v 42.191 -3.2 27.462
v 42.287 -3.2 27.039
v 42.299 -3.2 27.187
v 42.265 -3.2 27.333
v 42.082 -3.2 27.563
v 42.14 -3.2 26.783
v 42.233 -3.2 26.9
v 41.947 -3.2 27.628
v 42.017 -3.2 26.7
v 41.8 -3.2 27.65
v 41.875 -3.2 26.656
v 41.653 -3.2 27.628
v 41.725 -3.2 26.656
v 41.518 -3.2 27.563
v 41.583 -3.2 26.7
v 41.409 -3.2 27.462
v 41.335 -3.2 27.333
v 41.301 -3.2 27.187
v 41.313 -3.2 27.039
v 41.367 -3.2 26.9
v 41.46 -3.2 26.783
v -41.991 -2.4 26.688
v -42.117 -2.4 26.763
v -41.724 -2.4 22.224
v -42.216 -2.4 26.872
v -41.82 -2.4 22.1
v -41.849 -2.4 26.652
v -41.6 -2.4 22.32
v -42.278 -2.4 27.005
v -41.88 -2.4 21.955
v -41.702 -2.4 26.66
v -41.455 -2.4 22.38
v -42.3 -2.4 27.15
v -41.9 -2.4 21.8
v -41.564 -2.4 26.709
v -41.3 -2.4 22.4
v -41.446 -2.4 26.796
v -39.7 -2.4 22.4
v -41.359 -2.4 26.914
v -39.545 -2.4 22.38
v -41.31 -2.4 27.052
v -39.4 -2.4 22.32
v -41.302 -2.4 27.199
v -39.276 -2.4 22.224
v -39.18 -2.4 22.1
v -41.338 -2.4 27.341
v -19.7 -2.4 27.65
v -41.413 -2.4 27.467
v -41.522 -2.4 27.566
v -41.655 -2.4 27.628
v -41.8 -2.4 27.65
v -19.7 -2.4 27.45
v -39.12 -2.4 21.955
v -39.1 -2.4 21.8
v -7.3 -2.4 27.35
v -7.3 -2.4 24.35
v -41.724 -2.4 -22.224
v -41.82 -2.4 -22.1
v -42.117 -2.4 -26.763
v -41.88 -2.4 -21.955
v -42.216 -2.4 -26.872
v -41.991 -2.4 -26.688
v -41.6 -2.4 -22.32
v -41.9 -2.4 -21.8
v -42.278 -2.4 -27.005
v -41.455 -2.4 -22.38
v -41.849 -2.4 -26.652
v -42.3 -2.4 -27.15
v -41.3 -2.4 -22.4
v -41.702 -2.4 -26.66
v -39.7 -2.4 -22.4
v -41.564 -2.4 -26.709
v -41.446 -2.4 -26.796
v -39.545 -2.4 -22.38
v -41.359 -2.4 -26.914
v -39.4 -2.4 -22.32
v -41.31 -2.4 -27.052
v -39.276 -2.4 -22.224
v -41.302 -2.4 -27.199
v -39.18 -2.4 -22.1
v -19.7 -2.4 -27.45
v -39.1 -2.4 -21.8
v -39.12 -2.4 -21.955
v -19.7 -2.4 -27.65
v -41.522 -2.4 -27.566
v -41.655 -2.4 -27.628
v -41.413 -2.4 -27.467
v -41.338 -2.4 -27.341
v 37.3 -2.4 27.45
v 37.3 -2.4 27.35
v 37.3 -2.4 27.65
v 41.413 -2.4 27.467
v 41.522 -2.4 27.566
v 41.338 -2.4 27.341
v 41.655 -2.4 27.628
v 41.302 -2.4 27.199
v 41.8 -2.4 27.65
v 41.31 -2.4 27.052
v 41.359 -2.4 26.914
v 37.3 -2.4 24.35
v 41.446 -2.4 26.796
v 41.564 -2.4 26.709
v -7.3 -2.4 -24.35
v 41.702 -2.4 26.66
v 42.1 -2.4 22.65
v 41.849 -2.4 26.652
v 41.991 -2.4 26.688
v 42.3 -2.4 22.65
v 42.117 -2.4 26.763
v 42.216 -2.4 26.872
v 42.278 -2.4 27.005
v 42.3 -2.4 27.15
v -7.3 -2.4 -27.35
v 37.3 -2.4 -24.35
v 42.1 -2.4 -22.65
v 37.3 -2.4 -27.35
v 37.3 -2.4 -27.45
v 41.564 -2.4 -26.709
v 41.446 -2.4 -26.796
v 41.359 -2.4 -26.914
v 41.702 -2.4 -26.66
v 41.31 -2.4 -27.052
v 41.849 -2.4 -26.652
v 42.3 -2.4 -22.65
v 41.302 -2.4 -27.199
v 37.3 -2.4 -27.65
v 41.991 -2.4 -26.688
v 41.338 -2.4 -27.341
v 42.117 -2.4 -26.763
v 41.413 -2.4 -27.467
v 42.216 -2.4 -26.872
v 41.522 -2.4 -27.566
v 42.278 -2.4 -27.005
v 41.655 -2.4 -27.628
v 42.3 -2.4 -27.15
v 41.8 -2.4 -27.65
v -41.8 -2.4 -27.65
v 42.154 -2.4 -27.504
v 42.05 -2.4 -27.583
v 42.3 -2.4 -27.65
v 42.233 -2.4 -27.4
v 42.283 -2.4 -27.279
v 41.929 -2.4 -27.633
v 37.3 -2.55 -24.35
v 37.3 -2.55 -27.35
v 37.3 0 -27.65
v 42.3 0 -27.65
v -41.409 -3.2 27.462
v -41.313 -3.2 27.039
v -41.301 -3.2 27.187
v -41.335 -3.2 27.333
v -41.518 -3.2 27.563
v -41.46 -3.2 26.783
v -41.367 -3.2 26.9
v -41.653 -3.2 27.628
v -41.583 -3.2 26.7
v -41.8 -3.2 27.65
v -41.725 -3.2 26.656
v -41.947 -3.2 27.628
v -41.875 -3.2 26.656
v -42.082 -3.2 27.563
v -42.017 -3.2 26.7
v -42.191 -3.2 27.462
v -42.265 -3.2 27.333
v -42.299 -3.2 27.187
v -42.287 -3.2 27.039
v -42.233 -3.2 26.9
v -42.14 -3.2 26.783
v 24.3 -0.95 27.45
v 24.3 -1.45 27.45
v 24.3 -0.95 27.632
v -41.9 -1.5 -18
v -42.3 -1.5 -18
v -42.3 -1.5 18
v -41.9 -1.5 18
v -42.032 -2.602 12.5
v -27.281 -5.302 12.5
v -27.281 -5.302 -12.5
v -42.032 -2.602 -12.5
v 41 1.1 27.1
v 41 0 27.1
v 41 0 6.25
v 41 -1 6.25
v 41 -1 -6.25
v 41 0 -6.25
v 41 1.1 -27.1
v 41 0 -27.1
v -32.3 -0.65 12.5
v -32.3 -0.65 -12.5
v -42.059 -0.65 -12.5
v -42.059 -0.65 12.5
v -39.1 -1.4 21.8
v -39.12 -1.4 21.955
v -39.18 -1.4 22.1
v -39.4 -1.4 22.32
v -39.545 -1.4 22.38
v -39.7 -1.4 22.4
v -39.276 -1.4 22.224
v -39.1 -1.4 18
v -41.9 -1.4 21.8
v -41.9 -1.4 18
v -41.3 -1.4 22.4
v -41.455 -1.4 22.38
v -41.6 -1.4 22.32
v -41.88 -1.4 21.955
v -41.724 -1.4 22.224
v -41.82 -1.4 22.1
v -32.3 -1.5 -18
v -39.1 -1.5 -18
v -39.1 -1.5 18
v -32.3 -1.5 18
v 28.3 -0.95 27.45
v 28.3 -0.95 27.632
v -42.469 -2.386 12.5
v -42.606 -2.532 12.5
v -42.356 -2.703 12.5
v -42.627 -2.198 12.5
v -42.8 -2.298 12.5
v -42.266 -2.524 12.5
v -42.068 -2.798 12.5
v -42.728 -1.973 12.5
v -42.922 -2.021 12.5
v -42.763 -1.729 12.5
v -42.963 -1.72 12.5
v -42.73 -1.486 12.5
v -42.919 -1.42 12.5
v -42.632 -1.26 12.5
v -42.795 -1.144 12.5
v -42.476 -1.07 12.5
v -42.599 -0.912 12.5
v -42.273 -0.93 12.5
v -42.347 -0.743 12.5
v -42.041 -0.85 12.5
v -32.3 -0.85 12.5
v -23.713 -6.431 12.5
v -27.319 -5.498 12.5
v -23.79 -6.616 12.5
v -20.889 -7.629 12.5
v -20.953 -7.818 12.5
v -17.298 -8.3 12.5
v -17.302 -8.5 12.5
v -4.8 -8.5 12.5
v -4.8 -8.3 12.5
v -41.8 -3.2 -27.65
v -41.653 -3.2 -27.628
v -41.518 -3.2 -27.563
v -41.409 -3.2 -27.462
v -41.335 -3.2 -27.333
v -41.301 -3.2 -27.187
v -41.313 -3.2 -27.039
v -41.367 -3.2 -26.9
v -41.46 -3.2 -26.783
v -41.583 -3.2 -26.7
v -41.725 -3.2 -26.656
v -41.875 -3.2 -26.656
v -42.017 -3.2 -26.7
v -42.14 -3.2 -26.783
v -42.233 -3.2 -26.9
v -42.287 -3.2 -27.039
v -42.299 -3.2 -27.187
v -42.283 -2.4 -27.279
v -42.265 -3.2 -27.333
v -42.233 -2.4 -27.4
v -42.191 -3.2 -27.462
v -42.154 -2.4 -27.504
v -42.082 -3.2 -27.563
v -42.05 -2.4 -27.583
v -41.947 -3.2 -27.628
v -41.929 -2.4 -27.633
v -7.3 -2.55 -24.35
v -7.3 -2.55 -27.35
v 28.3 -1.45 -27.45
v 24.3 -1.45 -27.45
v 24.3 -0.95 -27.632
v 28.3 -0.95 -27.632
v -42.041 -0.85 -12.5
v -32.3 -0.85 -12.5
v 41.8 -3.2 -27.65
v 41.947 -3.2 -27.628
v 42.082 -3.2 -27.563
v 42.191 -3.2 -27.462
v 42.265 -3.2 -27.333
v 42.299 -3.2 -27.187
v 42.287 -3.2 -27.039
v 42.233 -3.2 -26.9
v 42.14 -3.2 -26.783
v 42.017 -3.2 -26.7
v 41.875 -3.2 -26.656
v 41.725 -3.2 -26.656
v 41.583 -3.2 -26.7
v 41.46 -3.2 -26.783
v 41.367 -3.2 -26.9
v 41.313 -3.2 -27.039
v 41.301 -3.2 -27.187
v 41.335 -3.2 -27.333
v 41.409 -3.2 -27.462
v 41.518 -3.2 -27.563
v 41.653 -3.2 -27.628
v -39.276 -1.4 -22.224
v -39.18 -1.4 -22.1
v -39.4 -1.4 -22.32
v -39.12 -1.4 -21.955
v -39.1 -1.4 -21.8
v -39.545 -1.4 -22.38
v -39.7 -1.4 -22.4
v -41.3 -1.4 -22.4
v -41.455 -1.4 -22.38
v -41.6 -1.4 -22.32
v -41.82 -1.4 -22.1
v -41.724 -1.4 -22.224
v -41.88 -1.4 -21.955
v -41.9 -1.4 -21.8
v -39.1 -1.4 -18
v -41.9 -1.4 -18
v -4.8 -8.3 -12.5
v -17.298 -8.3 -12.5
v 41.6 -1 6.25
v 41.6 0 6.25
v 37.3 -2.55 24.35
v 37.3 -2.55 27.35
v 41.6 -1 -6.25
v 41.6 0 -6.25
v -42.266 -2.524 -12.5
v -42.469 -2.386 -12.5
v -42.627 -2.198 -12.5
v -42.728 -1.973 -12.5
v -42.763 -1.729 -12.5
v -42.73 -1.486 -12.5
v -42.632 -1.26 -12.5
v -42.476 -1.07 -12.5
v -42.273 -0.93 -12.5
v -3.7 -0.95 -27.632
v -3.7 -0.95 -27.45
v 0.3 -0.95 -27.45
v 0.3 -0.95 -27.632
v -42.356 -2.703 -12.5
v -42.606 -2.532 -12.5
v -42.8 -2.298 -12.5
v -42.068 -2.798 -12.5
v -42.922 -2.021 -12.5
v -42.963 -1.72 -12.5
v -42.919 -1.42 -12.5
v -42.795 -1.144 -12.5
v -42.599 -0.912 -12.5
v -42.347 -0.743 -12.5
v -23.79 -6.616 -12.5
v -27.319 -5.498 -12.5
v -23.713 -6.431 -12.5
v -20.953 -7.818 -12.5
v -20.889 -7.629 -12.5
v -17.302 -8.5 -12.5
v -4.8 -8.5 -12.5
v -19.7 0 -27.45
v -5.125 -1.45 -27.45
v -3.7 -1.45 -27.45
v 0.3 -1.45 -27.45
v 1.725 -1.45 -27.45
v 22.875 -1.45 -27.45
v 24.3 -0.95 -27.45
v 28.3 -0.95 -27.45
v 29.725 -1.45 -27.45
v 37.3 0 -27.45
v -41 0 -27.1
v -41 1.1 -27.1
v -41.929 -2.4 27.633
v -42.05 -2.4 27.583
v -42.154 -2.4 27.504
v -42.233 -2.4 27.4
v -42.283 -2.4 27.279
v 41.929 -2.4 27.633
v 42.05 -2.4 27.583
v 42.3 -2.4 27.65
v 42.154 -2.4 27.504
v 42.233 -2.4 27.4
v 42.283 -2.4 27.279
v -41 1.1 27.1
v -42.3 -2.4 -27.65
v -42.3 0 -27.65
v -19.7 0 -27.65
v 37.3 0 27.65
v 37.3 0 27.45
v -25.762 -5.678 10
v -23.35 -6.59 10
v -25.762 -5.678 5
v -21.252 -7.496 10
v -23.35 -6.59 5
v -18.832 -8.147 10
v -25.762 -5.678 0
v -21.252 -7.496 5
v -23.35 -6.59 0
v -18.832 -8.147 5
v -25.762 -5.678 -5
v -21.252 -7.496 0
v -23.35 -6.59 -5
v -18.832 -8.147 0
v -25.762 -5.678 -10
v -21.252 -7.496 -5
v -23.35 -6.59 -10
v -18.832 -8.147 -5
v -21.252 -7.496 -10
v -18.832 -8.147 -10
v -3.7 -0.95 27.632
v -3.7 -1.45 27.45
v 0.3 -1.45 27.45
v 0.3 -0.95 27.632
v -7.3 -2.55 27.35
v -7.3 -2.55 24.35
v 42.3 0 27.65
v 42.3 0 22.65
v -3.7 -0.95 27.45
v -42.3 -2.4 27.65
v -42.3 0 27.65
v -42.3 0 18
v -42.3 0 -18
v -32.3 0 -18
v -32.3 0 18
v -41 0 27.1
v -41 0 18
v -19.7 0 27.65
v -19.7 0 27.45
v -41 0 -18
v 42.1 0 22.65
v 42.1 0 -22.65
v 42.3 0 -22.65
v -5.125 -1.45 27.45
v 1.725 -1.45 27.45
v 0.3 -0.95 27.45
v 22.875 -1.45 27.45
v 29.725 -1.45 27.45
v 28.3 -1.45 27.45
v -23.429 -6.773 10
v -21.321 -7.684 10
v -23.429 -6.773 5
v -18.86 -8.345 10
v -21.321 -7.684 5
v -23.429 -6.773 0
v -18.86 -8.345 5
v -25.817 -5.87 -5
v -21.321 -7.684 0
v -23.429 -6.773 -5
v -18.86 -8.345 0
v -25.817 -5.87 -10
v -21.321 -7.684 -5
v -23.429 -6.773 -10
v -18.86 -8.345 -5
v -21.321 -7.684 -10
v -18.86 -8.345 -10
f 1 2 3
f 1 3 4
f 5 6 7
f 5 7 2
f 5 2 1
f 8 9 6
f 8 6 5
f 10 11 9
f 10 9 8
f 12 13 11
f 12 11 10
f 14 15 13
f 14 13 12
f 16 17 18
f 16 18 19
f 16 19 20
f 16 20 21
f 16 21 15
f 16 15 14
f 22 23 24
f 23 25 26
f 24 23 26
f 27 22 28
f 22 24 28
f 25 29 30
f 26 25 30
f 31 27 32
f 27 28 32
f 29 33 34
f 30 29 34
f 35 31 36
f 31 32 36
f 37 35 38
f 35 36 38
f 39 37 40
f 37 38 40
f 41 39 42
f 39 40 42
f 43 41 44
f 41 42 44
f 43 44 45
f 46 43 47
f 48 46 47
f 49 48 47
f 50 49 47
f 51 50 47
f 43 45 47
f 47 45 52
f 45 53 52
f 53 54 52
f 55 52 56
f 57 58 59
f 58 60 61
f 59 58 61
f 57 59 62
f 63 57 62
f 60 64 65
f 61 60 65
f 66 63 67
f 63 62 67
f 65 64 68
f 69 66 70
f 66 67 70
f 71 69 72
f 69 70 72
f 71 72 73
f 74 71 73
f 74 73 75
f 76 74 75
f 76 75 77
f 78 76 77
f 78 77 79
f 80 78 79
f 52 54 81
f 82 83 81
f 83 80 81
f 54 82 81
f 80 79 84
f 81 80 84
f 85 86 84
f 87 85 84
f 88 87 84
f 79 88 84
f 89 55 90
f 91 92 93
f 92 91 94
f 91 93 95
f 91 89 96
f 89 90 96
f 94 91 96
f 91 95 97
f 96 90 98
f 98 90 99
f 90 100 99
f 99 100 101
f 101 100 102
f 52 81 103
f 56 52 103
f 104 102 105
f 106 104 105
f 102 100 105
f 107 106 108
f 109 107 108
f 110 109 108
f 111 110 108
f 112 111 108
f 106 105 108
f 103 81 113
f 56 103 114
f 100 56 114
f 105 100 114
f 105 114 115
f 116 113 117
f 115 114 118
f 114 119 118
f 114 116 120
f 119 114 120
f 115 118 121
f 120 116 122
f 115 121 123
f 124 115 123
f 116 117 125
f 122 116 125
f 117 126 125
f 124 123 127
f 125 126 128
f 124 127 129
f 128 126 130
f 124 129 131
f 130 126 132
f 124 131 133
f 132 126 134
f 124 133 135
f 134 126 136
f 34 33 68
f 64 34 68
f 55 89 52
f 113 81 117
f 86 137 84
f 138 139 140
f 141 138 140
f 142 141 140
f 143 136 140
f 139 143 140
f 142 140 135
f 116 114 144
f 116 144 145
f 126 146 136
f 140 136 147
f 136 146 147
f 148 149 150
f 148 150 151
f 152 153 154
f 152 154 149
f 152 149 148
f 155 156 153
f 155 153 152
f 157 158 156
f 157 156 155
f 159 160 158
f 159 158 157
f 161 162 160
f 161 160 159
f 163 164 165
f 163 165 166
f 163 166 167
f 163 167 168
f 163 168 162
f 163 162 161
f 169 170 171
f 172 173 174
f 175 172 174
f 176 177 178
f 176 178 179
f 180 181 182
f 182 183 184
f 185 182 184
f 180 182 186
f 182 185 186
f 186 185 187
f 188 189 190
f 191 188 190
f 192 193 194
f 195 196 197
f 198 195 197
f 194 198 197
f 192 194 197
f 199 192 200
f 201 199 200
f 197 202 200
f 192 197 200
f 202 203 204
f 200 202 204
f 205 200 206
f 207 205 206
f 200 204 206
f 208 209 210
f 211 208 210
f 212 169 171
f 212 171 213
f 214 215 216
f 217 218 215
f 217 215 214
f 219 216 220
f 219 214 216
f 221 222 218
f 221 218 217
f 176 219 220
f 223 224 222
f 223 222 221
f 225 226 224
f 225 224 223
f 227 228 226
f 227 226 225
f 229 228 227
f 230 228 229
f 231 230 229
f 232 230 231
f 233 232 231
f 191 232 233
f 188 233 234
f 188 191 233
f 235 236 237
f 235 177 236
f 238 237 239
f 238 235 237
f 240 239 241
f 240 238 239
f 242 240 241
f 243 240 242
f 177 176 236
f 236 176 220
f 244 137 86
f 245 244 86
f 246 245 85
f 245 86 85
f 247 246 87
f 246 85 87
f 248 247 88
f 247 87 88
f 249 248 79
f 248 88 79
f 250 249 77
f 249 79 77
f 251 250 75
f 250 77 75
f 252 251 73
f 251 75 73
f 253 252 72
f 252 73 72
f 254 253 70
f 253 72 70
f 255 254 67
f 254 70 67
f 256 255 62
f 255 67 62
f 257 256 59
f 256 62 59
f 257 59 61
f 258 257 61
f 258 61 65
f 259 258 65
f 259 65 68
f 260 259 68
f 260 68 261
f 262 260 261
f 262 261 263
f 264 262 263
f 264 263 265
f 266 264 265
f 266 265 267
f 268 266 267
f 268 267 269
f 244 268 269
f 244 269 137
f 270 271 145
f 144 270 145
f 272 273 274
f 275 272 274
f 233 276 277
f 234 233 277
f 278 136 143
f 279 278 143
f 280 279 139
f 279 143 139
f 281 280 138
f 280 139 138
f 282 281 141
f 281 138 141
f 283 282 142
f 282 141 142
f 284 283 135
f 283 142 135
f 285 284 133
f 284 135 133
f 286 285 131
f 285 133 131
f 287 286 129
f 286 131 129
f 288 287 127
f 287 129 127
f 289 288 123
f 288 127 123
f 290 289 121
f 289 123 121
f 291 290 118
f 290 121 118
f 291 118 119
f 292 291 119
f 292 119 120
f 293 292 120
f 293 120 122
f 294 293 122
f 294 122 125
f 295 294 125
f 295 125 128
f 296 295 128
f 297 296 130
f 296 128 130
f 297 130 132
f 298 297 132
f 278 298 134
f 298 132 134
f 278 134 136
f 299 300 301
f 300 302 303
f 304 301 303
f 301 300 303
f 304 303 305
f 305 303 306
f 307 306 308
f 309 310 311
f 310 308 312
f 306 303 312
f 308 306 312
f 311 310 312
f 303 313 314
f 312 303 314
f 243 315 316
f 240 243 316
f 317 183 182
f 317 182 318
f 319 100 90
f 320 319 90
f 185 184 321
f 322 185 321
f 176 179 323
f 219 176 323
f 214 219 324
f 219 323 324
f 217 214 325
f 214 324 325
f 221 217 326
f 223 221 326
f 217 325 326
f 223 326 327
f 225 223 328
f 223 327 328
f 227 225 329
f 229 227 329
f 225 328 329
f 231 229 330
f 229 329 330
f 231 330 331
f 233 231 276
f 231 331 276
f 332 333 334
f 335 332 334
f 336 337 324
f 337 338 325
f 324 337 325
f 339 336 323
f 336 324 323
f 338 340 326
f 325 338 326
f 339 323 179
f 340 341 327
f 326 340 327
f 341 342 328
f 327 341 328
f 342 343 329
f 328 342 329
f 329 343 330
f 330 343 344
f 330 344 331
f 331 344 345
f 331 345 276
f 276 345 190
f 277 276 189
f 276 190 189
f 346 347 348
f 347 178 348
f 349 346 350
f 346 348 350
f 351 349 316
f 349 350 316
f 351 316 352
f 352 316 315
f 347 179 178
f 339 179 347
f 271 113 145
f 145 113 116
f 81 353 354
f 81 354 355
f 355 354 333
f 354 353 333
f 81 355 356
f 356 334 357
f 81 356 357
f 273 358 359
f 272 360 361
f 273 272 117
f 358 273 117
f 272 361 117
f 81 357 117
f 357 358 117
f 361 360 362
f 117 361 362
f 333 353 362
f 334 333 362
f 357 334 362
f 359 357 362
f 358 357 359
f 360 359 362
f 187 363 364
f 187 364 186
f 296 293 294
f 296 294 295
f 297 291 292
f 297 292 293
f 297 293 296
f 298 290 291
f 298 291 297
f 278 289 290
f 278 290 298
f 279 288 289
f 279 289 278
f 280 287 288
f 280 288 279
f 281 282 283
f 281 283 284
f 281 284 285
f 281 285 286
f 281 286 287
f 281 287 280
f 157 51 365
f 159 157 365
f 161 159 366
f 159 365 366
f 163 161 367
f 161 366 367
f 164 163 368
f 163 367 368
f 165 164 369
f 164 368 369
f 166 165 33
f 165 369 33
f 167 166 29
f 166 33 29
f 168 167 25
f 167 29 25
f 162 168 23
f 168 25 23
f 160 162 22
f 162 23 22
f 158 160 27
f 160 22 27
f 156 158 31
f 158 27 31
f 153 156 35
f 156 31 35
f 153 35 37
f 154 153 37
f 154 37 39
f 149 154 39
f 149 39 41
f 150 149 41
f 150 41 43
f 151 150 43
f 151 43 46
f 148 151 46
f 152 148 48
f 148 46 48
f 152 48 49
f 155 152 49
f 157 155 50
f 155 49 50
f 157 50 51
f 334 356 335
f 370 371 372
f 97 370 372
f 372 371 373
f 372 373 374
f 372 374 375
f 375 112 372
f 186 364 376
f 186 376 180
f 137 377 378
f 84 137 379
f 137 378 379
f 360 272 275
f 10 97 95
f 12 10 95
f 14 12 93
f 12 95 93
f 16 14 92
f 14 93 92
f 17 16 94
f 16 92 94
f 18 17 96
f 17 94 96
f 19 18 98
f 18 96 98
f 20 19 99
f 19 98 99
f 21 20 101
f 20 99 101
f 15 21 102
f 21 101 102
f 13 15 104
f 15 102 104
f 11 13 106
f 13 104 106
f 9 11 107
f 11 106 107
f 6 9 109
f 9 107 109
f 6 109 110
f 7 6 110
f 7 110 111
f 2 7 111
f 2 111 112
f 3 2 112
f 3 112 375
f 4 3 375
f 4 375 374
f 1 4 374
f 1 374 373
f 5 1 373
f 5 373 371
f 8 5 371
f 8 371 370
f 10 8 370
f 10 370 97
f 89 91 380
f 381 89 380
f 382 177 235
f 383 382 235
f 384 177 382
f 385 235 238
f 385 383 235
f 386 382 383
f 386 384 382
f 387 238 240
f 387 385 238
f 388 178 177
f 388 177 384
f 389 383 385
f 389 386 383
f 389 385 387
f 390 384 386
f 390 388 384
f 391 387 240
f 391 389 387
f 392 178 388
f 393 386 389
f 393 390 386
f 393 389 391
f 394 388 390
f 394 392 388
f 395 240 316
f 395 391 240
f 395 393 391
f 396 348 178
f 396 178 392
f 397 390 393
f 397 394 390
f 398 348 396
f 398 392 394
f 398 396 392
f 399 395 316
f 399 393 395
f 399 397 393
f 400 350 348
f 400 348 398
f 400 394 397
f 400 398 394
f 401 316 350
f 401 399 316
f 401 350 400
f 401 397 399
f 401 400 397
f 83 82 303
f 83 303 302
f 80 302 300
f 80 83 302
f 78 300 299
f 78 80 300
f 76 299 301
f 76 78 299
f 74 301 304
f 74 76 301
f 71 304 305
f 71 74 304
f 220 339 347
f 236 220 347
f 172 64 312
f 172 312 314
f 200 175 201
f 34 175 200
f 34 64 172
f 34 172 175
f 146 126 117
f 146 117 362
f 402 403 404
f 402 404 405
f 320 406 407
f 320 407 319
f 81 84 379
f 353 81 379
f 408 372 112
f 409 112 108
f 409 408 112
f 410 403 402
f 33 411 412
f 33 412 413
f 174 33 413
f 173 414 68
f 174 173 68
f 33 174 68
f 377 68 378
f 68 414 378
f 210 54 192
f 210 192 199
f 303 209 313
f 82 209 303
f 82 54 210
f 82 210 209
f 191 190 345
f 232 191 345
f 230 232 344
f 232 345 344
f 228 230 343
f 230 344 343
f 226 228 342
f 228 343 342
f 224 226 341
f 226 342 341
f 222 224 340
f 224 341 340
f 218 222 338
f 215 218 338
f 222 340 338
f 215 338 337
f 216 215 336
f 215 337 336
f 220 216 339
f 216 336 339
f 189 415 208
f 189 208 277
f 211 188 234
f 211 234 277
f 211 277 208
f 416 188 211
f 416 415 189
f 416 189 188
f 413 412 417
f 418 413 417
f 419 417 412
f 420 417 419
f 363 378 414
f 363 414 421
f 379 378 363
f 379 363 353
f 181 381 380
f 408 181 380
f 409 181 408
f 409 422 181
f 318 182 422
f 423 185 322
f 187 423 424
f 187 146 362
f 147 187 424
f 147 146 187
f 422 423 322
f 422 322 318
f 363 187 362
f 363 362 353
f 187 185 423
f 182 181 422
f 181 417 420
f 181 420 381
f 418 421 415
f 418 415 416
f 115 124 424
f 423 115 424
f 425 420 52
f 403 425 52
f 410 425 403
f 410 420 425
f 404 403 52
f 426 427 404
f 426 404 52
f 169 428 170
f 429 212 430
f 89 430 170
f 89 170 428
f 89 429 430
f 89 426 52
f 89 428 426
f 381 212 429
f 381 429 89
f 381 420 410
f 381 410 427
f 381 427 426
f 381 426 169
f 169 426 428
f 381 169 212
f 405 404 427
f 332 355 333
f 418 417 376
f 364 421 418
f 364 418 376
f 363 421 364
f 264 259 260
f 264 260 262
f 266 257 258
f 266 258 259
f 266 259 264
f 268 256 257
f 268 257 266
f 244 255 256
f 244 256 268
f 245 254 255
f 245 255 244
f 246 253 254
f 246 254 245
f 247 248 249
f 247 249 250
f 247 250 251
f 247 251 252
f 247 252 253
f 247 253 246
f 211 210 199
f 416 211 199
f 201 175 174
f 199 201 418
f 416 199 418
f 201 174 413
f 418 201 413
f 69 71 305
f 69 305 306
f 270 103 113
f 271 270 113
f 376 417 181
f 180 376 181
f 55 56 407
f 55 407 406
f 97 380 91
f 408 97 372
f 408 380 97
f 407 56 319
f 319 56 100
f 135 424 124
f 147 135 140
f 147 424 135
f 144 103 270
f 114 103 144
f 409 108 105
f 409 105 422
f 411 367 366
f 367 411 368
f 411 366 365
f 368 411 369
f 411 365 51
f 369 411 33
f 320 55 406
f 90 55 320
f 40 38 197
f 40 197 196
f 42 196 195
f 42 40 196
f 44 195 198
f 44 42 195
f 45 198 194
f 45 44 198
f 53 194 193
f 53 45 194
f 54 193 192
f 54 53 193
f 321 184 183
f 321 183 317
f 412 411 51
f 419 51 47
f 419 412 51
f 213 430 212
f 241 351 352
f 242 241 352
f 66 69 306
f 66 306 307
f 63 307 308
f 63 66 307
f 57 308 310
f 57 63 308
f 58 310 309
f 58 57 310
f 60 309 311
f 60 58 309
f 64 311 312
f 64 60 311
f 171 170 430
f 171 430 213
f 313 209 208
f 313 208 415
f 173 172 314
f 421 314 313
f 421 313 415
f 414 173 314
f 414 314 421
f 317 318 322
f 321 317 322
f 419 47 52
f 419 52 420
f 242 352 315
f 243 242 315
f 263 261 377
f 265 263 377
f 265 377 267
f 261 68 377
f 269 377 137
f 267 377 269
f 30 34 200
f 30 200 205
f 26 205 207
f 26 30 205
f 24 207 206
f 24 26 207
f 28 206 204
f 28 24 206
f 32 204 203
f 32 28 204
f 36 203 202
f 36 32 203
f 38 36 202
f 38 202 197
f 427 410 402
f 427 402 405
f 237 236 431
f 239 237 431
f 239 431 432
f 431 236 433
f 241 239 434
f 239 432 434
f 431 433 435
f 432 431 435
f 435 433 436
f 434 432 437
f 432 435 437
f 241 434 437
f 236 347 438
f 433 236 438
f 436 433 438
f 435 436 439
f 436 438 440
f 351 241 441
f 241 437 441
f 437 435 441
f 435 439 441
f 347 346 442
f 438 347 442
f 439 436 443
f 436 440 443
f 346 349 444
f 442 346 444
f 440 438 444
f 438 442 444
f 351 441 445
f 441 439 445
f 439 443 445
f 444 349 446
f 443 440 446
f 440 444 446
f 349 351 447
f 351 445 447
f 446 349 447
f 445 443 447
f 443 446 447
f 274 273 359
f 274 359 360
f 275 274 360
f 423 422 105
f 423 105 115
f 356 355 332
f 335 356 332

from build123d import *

# Parameters (mm, degrees)
SKETCH1_W                  = 84.6
SKETCH1_H                  = 55.3
BOSS_EXTRUDE1_DEPTH        = 2.4
SKETCH2_W                  = 82
SKETCH2_H                  = 54.2
BOSS_EXTRUDE2_DEPTH        = 1.1
SKETCH3_R                  = 0.5
BOSS_EXTRUDE3_DEPTH        = 0.8
CUT_EXTRUDE1_DEPTH         = 1
SKETCH5_W                  = 57
SKETCH5_H                  = 2.4
CUT_EXTRUDE2_DEPTH         = 0.2
SKETCH6_W                  = 45.3
SKETCH6_H                  = 2.4
CUT_EXTRUDE3_DEPTH         = 0.2
SKETCH7_W                  = 44.6
SKETCH7_H                  = 3
BOSS_EXTRUDE4_DEPTH        = 0.15
SKETCH8_W                  = 0.6
SKETCH8_H                  = 12.5
CUT_EXTRUDE4_DEPTH         = 1
SKETCH9_W                  = 4
SKETCH9_H                  = 0.5
BOSS_EXTRUDE5_DEPTH        = 0.2
CHAMFER1_SIZE              = 0.2
CHAMFER1_SIZE_2            = 0.549495484
CHAMFER1_OF_MIRROR4_SIZE   = 0.2
CHAMFER1_OF_MIRROR4_SIZE_2 = 0.549495484
SKETCH10_W                 = 36
SKETCH10_H                 = 1.5
CUT_EXTRUDE5_DEPTH         = 10
BOSS_EXTRUDE7_DEPTH        = 12.5
BOSS_EXTRUDE7_DEPTH_BACK   = 12.5


with BuildPart() as part:
    # Sketch1 → Boss-Extrude1 (new body)
    with BuildSketch(Plane(origin=(0, 0, 0), x_dir=(1, 0, 0), z_dir=(0, 1, 0))):
        Rectangle(SKETCH1_W, SKETCH1_H)
    extrude(amount=-BOSS_EXTRUDE1_DEPTH)

    # Sketch2 → Boss-Extrude2 (add)
    with BuildSketch(Plane(origin=(0, 0, 0), x_dir=(1, 0, 0), z_dir=(0, 1, 0))):
        Rectangle(SKETCH2_W, SKETCH2_H)
    extrude(amount=BOSS_EXTRUDE2_DEPTH)

    # Sketch3 → Boss-Extrude3 (add)
    with BuildSketch(Plane.XZ.offset(2.4)):
        with Locations(Location((-41.8, 27.15, 0), (0, 0, 90))):
            Circle(SKETCH3_R)
        with Locations(Location((41.8, 27.15, 0), (0, 0, 90))):
            Circle(SKETCH3_R)
        with Locations(Location((41.8, -27.15, 0), (0, 0, 270))):
            Circle(SKETCH3_R)
        with Locations(Location((-41.8, -27.15, 0), (0, 0, 270))):
            Circle(SKETCH3_R)
    extrude(amount=BOSS_EXTRUDE3_DEPTH)

    # Sketch4 → Cut-Extrude1 (cut)
    with BuildSketch(Plane.XZ.offset(2.4)):
        with BuildLine():
            Line((-39.7, -22.4), (-41.3, -22.4))
            ThreePointArc((-41.3, -22.4), (-41.724264069, -22.224264069), (-41.9, -21.8))
            Line((-41.9, -21.8), (-41.9, 21.8))
            ThreePointArc((-41.9, 21.8), (-41.724264069, 22.224264069), (-41.3, 22.4))
            Line((-41.3, 22.4), (-39.7, 22.4))
            ThreePointArc((-39.7, 22.4), (-39.275735931, 22.224264069), (-39.1, 21.8))
            Line((-39.1, 21.8), (-39.1, -21.8))
            ThreePointArc((-39.1, -21.8), (-39.275735931, -22.224264069), (-39.7, -22.4))
        make_face()
    extrude(amount=-CUT_EXTRUDE1_DEPTH, mode=Mode.SUBTRACT)

    # Sketch5 → Cut-Extrude2 (cut)
    with BuildSketch(Plane.XY.offset(27.65)):
        with Locations((8.8, -1.2)):
            Rectangle(SKETCH5_W, SKETCH5_H)
    cut_extrude2 = extrude(amount=-CUT_EXTRUDE2_DEPTH, mode=Mode.SUBTRACT)

    # Mirror1: Cut-Extrude2 across plane
    add(cut_extrude2.mirror(Plane.XY), mode=Mode.SUBTRACT)

    # Sketch6 → Cut-Extrude3 (cut)
    with BuildSketch(Plane(origin=(42.3, 0, 0), x_dir=(0, 0, -1), z_dir=(1, 0, 0))):
        with Locations((0, -1.2)):
            Rectangle(SKETCH6_W, SKETCH6_H)
    extrude(amount=-CUT_EXTRUDE3_DEPTH, mode=Mode.SUBTRACT)

    # Sketch7 → Boss-Extrude4 (add)
    with BuildSketch(Plane.XZ.offset(2.4)):
        with Locations((15, 25.85)):
            Rectangle(SKETCH7_W, SKETCH7_H)
    boss_extrude4 = extrude(amount=BOSS_EXTRUDE4_DEPTH)

    # Mirror2: Boss-Extrude4 across plane
    add(boss_extrude4.mirror(Plane.XY))

    # Sketch8 → Cut-Extrude4 (cut)
    with BuildSketch(Plane(origin=(0, 0, 0), x_dir=(1, 0, 0), z_dir=(0, 1, 0))):
        with Locations((41.3, 0)):
            Rectangle(SKETCH8_W, SKETCH8_H)
    extrude(amount=-CUT_EXTRUDE4_DEPTH, mode=Mode.SUBTRACT)

    # Sketch9 → Boss-Extrude5 (add)
    with BuildSketch(Plane.XY.offset(27.45)):
        with Locations((-1.7, -1.2)):
            Rectangle(SKETCH9_W, SKETCH9_H)
        with Locations((26.3, -1.2)):
            Rectangle(SKETCH9_W, SKETCH9_H)
    boss_extrude5 = extrude(amount=BOSS_EXTRUDE5_DEPTH)

    # Chamfer1
    # the kernel refuses this chamfer: 0.549495484, 0.2 mm, written as the material it takes off along each edge
    with BuildSketch(Plane(origin=(29.72549829, -1.45, 27.65), x_dir=(0, -0.0990409022520511, -0.9950833631817485), z_dir=(-1, 0, 0))) as chamfer1_piece_1_section:
        Polygon((CHAMFER1_SIZE * 0.995083363182, -CHAMFER1_SIZE * 0.0990409022521), (-CHAMFER1_SIZE_2 * 0.0990409022324, -CHAMFER1_SIZE_2 * 0.995083362984), (0, 0), align=None)
    chamfer1_piece_1 = extrude(amount=6.85099658, mode=Mode.PRIVATE)
    chamfer1_piece_1 = split(chamfer1_piece_1, bisect_by=Plane(origin=(26.3, -1.261493049, 27.45), z_dir=(0, 0, 1)), keep=Keep.TOP, mode=Mode.PRIVATE)
    add(chamfer1_piece_1, mode=Mode.SUBTRACT)
    with BuildSketch(Plane(origin=(1.72549829, -1.45, 27.65), x_dir=(0, -0.0990409022520511, -0.9950833631817485), z_dir=(-1, 0, 0))) as chamfer1_piece_2_section:
        Polygon((CHAMFER1_SIZE * 0.995083363182, -CHAMFER1_SIZE * 0.0990409022521), (-CHAMFER1_SIZE_2 * 0.0990409022324, -CHAMFER1_SIZE_2 * 0.995083362984), (0, 0), align=None)
    chamfer1_piece_2 = extrude(amount=6.85099658, mode=Mode.PRIVATE)
    chamfer1_piece_2 = split(chamfer1_piece_2, bisect_by=Plane(origin=(-1.7, -1.261493049, 27.45), z_dir=(0, 0, 1)), keep=Keep.TOP, mode=Mode.PRIVATE)
    add(chamfer1_piece_2, mode=Mode.SUBTRACT)

    # Mirror4: Boss-Extrude5 across plane
    add(boss_extrude5.mirror(Plane.XY))

    # Chamfer1 of Mirror4
    # the kernel refuses this chamfer: 0.549495484, 0.2 mm, written as the material it takes off along each edge
    with BuildSketch(Plane(origin=(29.72549829, -1.45, -27.65), x_dir=(0, -0.0990409022520511, 0.9950833631817485), z_dir=(-1, 0, 0))) as chamfer1_of_mirror4_piece_1_section:
        Polygon((CHAMFER1_OF_MIRROR4_SIZE * 0.995083363182, CHAMFER1_OF_MIRROR4_SIZE * 0.0990409022521), (-CHAMFER1_OF_MIRROR4_SIZE_2 * 0.0990409022324, CHAMFER1_OF_MIRROR4_SIZE_2 * 0.995083362984), (0, 0), align=None)
    chamfer1_of_mirror4_piece_1 = extrude(amount=6.85099658, mode=Mode.PRIVATE)
    chamfer1_of_mirror4_piece_1 = split(chamfer1_of_mirror4_piece_1, bisect_by=Plane(origin=(26.3, -1.261493049, -27.45), z_dir=(0, 0, -1)), keep=Keep.TOP, mode=Mode.PRIVATE)
    add(chamfer1_of_mirror4_piece_1, mode=Mode.SUBTRACT)
    with BuildSketch(Plane(origin=(1.72549829, -1.45, -27.65), x_dir=(0, -0.0990409022520511, 0.9950833631817485), z_dir=(-1, 0, 0))) as chamfer1_of_mirror4_piece_2_section:
        Polygon((CHAMFER1_OF_MIRROR4_SIZE * 0.995083363182, CHAMFER1_OF_MIRROR4_SIZE * 0.0990409022521), (-CHAMFER1_OF_MIRROR4_SIZE_2 * 0.0990409022324, CHAMFER1_OF_MIRROR4_SIZE_2 * 0.995083362984), (0, 0), align=None)
    chamfer1_of_mirror4_piece_2 = extrude(amount=6.85099658, mode=Mode.PRIVATE)
    chamfer1_of_mirror4_piece_2 = split(chamfer1_of_mirror4_piece_2, bisect_by=Plane(origin=(-1.7, -1.261493049, -27.45), z_dir=(0, 0, -1)), keep=Keep.TOP, mode=Mode.PRIVATE)
    add(chamfer1_of_mirror4_piece_2, mode=Mode.SUBTRACT)

    # Sketch10 → Cut-Extrude5 (cut)
    with BuildSketch(Plane.ZY.offset(42.3)):
        with Locations((0, -0.75)):
            Rectangle(SKETCH10_W, SKETCH10_H)
    extrude(amount=-CUT_EXTRUDE5_DEPTH, mode=Mode.SUBTRACT)

    # Sketch13 → Boss-Extrude7 (add, two sides: drawn at the far end of the back side and taken through both)
    with BuildSketch(Plane.XY.offset(-BOSS_EXTRUDE7_DEPTH_BACK)):
        with BuildLine():
            Line((-42.05, -0.75), (-32.3, -0.75))
            Line((-32.3, -0.75), (-32.3, -0.65))
            Line((-32.3, -0.65), (-42.058857344, -0.65))
            ThreePointArc((-42.058857344, -0.65), (-42.962715901, -1.720353295), (-42.068005903, -2.798365581))
            Line((-42.068005903, -2.798365581), (-27.318842711, -5.498212402))
            add(Edge.make_bspline(
                [(-27.318842711, -5.498212402), (-27.055971917, -5.550974674), (-26.517605359, -5.672128419), (-25.572291866, -5.932507667), (-24.521729024, -6.300209586), (-23.417642306, -6.772863788), (-22.38181971, -7.248072884), (-21.335698344, -7.694021321), (-20.202294115, -8.077787346), (-19.113789609, -8.318235721), (-18.133663704, -8.446100314), (-17.574099695, -8.487090287), (-17.302374167, -8.5)],
                knots=[6.323e-05, 6.323e-05, 6.323e-05, 6.323e-05, 0.062570215, 0.125077199, 0.250091168, 0.375105137, 0.500119106, 0.625133075, 0.750147043, 0.875161012, 0.937667997, 1.000174981, 1.000174981, 1.000174981, 1.000174981], degree=3))
            Line((-17.302374167, -8.5), (-4.8, -8.5))
            Line((-4.8, -8.5), (-4.8, -8.4))
            Line((-4.8, -8.4), (-17.3, -8.4))
            add(Edge.make_bspline(
                [(-27.3, -5.4), (-22.890715179, -6.284799168), (-21.81761674, -8.185367475), (-17.3, -8.4)],
                knots=[0, 0, 0, 0, 1, 1, 1, 1], degree=3))
            Line((-27.3, -5.4), (-42.05, -2.7))
            ThreePointArc((-42.05, -2.7), (-42.862725794, -1.725), (-42.05, -0.75))
        make_face()
        with BuildLine():
            Line((-32.3, -0.85), (-32.3, -0.75))
            Line((-32.3, -0.75), (-42.05, -0.75))
            ThreePointArc((-42.05, -0.75), (-42.862725794, -1.725), (-42.05, -2.7))
            Line((-42.05, -2.7), (-27.3, -5.4))
            add(Edge.make_bspline(
                [(-27.3, -5.4), (-22.890715179, -6.284799168), (-21.81761674, -8.185367475), (-17.3, -8.4)],
                knots=[0, 0, 0, 0, 1, 1, 1, 1], degree=3))
            Line((-17.3, -8.4), (-4.8, -8.4))
            Line((-4.8, -8.4), (-4.8, -8.3))
            Line((-4.8, -8.3), (-17.297622246, -8.3))
            add(Edge.make_bspline(
                [(-27.281158431, -5.301787389), (-27.015284827, -5.35513952), (-26.470914345, -5.477568661), (-25.513851699, -5.741064097), (-24.450268814, -6.113231913), (-23.336923139, -6.589854571), (-22.30113605, -7.06504573), (-21.26539226, -7.506542017), (-20.151183505, -7.883950719), (-19.082330822, -8.120417996), (-18.117886975, -8.246552851), (-17.565625944, -8.287228528), (-17.297622246, -8.3)],
                knots=[-6.2969e-05, -6.2969e-05, -6.2969e-05, -6.2969e-05, 0.062429979, 0.124922927, 0.249908823, 0.37489472, 0.499880616, 0.624866512, 0.749852409, 0.874838305, 0.937331253, 0.999824201, 0.999824201, 0.999824201, 0.999824201], degree=3))
            Line((-27.281158431, -5.301787389), (-42.031994097, -2.601634419))
            ThreePointArc((-42.031994097, -2.601634419), (-42.762714839, -1.729418922), (-42.040679496, -0.85))
            Line((-42.040679496, -0.85), (-32.3, -0.85))
        make_face()
    extrude(amount=BOSS_EXTRUDE7_DEPTH + BOSS_EXTRUDE7_DEPTH_BACK)


solid = part.part
